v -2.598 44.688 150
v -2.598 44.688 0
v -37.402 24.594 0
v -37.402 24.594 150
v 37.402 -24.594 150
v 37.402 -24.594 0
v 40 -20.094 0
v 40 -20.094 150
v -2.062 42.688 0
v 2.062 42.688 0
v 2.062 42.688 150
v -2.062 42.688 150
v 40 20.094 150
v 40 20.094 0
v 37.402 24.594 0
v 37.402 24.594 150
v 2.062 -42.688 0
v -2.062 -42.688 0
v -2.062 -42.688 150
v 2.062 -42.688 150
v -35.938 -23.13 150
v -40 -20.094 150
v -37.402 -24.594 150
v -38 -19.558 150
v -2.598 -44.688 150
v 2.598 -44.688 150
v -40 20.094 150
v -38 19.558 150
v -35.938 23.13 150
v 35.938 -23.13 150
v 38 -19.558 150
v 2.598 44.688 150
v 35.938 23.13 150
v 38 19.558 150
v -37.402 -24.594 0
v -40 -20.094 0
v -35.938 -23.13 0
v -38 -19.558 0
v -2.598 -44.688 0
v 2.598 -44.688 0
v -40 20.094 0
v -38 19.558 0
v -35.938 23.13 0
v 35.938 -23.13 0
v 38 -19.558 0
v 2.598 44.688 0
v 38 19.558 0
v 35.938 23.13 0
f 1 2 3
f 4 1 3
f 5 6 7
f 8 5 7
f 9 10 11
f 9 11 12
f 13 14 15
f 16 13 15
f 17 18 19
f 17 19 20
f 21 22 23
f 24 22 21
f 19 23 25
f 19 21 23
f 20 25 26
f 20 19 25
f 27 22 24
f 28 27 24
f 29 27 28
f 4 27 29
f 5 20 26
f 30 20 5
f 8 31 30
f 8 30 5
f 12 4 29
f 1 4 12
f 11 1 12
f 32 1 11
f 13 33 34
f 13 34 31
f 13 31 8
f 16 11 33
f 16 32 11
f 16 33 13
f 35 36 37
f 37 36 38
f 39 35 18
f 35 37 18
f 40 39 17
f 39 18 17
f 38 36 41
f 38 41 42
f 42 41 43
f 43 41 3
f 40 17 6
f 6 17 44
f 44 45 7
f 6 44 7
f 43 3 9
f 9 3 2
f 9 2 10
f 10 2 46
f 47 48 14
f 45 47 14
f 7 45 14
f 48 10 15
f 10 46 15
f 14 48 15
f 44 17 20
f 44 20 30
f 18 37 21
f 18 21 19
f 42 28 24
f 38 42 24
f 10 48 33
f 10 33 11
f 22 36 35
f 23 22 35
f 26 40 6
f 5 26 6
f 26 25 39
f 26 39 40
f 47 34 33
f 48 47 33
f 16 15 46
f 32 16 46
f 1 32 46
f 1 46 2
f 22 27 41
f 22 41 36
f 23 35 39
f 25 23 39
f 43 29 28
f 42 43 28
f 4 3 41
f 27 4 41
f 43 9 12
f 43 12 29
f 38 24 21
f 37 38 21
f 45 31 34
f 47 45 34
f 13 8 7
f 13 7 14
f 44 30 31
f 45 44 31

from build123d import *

# Parameters (mm, degrees)
EXTRUDE_1_DEPTH = 150


with BuildPart() as part:
    # Эскиз1 → Бобышка-Вытянуть1 (new body)
    with BuildSketch(Plane.XY):
        Polygon((2.598076211, 44.688021535), (-2.598076211, 44.688021535), (-37.401923789, 24.594010768), (-40, 20.094010768), (-40, -20.094010768), (-37.401923789, -24.594010768), (-2.598076211, -44.688021535), (2.598076211, -44.688021535), (37.401923789, -24.594010768), (40, -20.094010768), (40, 20.094010768), (37.401923789, 24.594010768), align=None)
        Polygon((-2.062177826, 42.688021535), (-35.937822174, 23.129909152), (-38, 19.558112383), (-38, -19.558112383), (-35.937822174, -23.129909152), (-2.062177826, -42.688021535), (2.062177826, -42.688021535), (35.937822174, -23.129909152), (38, -19.558112383), (38, 19.558112383), (35.937822174, 23.129909152), (2.062177826, 42.688021535), align=None, mode=Mode.SUBTRACT)
    extrude(amount=EXTRUDE_1_DEPTH)


solid = part.part
